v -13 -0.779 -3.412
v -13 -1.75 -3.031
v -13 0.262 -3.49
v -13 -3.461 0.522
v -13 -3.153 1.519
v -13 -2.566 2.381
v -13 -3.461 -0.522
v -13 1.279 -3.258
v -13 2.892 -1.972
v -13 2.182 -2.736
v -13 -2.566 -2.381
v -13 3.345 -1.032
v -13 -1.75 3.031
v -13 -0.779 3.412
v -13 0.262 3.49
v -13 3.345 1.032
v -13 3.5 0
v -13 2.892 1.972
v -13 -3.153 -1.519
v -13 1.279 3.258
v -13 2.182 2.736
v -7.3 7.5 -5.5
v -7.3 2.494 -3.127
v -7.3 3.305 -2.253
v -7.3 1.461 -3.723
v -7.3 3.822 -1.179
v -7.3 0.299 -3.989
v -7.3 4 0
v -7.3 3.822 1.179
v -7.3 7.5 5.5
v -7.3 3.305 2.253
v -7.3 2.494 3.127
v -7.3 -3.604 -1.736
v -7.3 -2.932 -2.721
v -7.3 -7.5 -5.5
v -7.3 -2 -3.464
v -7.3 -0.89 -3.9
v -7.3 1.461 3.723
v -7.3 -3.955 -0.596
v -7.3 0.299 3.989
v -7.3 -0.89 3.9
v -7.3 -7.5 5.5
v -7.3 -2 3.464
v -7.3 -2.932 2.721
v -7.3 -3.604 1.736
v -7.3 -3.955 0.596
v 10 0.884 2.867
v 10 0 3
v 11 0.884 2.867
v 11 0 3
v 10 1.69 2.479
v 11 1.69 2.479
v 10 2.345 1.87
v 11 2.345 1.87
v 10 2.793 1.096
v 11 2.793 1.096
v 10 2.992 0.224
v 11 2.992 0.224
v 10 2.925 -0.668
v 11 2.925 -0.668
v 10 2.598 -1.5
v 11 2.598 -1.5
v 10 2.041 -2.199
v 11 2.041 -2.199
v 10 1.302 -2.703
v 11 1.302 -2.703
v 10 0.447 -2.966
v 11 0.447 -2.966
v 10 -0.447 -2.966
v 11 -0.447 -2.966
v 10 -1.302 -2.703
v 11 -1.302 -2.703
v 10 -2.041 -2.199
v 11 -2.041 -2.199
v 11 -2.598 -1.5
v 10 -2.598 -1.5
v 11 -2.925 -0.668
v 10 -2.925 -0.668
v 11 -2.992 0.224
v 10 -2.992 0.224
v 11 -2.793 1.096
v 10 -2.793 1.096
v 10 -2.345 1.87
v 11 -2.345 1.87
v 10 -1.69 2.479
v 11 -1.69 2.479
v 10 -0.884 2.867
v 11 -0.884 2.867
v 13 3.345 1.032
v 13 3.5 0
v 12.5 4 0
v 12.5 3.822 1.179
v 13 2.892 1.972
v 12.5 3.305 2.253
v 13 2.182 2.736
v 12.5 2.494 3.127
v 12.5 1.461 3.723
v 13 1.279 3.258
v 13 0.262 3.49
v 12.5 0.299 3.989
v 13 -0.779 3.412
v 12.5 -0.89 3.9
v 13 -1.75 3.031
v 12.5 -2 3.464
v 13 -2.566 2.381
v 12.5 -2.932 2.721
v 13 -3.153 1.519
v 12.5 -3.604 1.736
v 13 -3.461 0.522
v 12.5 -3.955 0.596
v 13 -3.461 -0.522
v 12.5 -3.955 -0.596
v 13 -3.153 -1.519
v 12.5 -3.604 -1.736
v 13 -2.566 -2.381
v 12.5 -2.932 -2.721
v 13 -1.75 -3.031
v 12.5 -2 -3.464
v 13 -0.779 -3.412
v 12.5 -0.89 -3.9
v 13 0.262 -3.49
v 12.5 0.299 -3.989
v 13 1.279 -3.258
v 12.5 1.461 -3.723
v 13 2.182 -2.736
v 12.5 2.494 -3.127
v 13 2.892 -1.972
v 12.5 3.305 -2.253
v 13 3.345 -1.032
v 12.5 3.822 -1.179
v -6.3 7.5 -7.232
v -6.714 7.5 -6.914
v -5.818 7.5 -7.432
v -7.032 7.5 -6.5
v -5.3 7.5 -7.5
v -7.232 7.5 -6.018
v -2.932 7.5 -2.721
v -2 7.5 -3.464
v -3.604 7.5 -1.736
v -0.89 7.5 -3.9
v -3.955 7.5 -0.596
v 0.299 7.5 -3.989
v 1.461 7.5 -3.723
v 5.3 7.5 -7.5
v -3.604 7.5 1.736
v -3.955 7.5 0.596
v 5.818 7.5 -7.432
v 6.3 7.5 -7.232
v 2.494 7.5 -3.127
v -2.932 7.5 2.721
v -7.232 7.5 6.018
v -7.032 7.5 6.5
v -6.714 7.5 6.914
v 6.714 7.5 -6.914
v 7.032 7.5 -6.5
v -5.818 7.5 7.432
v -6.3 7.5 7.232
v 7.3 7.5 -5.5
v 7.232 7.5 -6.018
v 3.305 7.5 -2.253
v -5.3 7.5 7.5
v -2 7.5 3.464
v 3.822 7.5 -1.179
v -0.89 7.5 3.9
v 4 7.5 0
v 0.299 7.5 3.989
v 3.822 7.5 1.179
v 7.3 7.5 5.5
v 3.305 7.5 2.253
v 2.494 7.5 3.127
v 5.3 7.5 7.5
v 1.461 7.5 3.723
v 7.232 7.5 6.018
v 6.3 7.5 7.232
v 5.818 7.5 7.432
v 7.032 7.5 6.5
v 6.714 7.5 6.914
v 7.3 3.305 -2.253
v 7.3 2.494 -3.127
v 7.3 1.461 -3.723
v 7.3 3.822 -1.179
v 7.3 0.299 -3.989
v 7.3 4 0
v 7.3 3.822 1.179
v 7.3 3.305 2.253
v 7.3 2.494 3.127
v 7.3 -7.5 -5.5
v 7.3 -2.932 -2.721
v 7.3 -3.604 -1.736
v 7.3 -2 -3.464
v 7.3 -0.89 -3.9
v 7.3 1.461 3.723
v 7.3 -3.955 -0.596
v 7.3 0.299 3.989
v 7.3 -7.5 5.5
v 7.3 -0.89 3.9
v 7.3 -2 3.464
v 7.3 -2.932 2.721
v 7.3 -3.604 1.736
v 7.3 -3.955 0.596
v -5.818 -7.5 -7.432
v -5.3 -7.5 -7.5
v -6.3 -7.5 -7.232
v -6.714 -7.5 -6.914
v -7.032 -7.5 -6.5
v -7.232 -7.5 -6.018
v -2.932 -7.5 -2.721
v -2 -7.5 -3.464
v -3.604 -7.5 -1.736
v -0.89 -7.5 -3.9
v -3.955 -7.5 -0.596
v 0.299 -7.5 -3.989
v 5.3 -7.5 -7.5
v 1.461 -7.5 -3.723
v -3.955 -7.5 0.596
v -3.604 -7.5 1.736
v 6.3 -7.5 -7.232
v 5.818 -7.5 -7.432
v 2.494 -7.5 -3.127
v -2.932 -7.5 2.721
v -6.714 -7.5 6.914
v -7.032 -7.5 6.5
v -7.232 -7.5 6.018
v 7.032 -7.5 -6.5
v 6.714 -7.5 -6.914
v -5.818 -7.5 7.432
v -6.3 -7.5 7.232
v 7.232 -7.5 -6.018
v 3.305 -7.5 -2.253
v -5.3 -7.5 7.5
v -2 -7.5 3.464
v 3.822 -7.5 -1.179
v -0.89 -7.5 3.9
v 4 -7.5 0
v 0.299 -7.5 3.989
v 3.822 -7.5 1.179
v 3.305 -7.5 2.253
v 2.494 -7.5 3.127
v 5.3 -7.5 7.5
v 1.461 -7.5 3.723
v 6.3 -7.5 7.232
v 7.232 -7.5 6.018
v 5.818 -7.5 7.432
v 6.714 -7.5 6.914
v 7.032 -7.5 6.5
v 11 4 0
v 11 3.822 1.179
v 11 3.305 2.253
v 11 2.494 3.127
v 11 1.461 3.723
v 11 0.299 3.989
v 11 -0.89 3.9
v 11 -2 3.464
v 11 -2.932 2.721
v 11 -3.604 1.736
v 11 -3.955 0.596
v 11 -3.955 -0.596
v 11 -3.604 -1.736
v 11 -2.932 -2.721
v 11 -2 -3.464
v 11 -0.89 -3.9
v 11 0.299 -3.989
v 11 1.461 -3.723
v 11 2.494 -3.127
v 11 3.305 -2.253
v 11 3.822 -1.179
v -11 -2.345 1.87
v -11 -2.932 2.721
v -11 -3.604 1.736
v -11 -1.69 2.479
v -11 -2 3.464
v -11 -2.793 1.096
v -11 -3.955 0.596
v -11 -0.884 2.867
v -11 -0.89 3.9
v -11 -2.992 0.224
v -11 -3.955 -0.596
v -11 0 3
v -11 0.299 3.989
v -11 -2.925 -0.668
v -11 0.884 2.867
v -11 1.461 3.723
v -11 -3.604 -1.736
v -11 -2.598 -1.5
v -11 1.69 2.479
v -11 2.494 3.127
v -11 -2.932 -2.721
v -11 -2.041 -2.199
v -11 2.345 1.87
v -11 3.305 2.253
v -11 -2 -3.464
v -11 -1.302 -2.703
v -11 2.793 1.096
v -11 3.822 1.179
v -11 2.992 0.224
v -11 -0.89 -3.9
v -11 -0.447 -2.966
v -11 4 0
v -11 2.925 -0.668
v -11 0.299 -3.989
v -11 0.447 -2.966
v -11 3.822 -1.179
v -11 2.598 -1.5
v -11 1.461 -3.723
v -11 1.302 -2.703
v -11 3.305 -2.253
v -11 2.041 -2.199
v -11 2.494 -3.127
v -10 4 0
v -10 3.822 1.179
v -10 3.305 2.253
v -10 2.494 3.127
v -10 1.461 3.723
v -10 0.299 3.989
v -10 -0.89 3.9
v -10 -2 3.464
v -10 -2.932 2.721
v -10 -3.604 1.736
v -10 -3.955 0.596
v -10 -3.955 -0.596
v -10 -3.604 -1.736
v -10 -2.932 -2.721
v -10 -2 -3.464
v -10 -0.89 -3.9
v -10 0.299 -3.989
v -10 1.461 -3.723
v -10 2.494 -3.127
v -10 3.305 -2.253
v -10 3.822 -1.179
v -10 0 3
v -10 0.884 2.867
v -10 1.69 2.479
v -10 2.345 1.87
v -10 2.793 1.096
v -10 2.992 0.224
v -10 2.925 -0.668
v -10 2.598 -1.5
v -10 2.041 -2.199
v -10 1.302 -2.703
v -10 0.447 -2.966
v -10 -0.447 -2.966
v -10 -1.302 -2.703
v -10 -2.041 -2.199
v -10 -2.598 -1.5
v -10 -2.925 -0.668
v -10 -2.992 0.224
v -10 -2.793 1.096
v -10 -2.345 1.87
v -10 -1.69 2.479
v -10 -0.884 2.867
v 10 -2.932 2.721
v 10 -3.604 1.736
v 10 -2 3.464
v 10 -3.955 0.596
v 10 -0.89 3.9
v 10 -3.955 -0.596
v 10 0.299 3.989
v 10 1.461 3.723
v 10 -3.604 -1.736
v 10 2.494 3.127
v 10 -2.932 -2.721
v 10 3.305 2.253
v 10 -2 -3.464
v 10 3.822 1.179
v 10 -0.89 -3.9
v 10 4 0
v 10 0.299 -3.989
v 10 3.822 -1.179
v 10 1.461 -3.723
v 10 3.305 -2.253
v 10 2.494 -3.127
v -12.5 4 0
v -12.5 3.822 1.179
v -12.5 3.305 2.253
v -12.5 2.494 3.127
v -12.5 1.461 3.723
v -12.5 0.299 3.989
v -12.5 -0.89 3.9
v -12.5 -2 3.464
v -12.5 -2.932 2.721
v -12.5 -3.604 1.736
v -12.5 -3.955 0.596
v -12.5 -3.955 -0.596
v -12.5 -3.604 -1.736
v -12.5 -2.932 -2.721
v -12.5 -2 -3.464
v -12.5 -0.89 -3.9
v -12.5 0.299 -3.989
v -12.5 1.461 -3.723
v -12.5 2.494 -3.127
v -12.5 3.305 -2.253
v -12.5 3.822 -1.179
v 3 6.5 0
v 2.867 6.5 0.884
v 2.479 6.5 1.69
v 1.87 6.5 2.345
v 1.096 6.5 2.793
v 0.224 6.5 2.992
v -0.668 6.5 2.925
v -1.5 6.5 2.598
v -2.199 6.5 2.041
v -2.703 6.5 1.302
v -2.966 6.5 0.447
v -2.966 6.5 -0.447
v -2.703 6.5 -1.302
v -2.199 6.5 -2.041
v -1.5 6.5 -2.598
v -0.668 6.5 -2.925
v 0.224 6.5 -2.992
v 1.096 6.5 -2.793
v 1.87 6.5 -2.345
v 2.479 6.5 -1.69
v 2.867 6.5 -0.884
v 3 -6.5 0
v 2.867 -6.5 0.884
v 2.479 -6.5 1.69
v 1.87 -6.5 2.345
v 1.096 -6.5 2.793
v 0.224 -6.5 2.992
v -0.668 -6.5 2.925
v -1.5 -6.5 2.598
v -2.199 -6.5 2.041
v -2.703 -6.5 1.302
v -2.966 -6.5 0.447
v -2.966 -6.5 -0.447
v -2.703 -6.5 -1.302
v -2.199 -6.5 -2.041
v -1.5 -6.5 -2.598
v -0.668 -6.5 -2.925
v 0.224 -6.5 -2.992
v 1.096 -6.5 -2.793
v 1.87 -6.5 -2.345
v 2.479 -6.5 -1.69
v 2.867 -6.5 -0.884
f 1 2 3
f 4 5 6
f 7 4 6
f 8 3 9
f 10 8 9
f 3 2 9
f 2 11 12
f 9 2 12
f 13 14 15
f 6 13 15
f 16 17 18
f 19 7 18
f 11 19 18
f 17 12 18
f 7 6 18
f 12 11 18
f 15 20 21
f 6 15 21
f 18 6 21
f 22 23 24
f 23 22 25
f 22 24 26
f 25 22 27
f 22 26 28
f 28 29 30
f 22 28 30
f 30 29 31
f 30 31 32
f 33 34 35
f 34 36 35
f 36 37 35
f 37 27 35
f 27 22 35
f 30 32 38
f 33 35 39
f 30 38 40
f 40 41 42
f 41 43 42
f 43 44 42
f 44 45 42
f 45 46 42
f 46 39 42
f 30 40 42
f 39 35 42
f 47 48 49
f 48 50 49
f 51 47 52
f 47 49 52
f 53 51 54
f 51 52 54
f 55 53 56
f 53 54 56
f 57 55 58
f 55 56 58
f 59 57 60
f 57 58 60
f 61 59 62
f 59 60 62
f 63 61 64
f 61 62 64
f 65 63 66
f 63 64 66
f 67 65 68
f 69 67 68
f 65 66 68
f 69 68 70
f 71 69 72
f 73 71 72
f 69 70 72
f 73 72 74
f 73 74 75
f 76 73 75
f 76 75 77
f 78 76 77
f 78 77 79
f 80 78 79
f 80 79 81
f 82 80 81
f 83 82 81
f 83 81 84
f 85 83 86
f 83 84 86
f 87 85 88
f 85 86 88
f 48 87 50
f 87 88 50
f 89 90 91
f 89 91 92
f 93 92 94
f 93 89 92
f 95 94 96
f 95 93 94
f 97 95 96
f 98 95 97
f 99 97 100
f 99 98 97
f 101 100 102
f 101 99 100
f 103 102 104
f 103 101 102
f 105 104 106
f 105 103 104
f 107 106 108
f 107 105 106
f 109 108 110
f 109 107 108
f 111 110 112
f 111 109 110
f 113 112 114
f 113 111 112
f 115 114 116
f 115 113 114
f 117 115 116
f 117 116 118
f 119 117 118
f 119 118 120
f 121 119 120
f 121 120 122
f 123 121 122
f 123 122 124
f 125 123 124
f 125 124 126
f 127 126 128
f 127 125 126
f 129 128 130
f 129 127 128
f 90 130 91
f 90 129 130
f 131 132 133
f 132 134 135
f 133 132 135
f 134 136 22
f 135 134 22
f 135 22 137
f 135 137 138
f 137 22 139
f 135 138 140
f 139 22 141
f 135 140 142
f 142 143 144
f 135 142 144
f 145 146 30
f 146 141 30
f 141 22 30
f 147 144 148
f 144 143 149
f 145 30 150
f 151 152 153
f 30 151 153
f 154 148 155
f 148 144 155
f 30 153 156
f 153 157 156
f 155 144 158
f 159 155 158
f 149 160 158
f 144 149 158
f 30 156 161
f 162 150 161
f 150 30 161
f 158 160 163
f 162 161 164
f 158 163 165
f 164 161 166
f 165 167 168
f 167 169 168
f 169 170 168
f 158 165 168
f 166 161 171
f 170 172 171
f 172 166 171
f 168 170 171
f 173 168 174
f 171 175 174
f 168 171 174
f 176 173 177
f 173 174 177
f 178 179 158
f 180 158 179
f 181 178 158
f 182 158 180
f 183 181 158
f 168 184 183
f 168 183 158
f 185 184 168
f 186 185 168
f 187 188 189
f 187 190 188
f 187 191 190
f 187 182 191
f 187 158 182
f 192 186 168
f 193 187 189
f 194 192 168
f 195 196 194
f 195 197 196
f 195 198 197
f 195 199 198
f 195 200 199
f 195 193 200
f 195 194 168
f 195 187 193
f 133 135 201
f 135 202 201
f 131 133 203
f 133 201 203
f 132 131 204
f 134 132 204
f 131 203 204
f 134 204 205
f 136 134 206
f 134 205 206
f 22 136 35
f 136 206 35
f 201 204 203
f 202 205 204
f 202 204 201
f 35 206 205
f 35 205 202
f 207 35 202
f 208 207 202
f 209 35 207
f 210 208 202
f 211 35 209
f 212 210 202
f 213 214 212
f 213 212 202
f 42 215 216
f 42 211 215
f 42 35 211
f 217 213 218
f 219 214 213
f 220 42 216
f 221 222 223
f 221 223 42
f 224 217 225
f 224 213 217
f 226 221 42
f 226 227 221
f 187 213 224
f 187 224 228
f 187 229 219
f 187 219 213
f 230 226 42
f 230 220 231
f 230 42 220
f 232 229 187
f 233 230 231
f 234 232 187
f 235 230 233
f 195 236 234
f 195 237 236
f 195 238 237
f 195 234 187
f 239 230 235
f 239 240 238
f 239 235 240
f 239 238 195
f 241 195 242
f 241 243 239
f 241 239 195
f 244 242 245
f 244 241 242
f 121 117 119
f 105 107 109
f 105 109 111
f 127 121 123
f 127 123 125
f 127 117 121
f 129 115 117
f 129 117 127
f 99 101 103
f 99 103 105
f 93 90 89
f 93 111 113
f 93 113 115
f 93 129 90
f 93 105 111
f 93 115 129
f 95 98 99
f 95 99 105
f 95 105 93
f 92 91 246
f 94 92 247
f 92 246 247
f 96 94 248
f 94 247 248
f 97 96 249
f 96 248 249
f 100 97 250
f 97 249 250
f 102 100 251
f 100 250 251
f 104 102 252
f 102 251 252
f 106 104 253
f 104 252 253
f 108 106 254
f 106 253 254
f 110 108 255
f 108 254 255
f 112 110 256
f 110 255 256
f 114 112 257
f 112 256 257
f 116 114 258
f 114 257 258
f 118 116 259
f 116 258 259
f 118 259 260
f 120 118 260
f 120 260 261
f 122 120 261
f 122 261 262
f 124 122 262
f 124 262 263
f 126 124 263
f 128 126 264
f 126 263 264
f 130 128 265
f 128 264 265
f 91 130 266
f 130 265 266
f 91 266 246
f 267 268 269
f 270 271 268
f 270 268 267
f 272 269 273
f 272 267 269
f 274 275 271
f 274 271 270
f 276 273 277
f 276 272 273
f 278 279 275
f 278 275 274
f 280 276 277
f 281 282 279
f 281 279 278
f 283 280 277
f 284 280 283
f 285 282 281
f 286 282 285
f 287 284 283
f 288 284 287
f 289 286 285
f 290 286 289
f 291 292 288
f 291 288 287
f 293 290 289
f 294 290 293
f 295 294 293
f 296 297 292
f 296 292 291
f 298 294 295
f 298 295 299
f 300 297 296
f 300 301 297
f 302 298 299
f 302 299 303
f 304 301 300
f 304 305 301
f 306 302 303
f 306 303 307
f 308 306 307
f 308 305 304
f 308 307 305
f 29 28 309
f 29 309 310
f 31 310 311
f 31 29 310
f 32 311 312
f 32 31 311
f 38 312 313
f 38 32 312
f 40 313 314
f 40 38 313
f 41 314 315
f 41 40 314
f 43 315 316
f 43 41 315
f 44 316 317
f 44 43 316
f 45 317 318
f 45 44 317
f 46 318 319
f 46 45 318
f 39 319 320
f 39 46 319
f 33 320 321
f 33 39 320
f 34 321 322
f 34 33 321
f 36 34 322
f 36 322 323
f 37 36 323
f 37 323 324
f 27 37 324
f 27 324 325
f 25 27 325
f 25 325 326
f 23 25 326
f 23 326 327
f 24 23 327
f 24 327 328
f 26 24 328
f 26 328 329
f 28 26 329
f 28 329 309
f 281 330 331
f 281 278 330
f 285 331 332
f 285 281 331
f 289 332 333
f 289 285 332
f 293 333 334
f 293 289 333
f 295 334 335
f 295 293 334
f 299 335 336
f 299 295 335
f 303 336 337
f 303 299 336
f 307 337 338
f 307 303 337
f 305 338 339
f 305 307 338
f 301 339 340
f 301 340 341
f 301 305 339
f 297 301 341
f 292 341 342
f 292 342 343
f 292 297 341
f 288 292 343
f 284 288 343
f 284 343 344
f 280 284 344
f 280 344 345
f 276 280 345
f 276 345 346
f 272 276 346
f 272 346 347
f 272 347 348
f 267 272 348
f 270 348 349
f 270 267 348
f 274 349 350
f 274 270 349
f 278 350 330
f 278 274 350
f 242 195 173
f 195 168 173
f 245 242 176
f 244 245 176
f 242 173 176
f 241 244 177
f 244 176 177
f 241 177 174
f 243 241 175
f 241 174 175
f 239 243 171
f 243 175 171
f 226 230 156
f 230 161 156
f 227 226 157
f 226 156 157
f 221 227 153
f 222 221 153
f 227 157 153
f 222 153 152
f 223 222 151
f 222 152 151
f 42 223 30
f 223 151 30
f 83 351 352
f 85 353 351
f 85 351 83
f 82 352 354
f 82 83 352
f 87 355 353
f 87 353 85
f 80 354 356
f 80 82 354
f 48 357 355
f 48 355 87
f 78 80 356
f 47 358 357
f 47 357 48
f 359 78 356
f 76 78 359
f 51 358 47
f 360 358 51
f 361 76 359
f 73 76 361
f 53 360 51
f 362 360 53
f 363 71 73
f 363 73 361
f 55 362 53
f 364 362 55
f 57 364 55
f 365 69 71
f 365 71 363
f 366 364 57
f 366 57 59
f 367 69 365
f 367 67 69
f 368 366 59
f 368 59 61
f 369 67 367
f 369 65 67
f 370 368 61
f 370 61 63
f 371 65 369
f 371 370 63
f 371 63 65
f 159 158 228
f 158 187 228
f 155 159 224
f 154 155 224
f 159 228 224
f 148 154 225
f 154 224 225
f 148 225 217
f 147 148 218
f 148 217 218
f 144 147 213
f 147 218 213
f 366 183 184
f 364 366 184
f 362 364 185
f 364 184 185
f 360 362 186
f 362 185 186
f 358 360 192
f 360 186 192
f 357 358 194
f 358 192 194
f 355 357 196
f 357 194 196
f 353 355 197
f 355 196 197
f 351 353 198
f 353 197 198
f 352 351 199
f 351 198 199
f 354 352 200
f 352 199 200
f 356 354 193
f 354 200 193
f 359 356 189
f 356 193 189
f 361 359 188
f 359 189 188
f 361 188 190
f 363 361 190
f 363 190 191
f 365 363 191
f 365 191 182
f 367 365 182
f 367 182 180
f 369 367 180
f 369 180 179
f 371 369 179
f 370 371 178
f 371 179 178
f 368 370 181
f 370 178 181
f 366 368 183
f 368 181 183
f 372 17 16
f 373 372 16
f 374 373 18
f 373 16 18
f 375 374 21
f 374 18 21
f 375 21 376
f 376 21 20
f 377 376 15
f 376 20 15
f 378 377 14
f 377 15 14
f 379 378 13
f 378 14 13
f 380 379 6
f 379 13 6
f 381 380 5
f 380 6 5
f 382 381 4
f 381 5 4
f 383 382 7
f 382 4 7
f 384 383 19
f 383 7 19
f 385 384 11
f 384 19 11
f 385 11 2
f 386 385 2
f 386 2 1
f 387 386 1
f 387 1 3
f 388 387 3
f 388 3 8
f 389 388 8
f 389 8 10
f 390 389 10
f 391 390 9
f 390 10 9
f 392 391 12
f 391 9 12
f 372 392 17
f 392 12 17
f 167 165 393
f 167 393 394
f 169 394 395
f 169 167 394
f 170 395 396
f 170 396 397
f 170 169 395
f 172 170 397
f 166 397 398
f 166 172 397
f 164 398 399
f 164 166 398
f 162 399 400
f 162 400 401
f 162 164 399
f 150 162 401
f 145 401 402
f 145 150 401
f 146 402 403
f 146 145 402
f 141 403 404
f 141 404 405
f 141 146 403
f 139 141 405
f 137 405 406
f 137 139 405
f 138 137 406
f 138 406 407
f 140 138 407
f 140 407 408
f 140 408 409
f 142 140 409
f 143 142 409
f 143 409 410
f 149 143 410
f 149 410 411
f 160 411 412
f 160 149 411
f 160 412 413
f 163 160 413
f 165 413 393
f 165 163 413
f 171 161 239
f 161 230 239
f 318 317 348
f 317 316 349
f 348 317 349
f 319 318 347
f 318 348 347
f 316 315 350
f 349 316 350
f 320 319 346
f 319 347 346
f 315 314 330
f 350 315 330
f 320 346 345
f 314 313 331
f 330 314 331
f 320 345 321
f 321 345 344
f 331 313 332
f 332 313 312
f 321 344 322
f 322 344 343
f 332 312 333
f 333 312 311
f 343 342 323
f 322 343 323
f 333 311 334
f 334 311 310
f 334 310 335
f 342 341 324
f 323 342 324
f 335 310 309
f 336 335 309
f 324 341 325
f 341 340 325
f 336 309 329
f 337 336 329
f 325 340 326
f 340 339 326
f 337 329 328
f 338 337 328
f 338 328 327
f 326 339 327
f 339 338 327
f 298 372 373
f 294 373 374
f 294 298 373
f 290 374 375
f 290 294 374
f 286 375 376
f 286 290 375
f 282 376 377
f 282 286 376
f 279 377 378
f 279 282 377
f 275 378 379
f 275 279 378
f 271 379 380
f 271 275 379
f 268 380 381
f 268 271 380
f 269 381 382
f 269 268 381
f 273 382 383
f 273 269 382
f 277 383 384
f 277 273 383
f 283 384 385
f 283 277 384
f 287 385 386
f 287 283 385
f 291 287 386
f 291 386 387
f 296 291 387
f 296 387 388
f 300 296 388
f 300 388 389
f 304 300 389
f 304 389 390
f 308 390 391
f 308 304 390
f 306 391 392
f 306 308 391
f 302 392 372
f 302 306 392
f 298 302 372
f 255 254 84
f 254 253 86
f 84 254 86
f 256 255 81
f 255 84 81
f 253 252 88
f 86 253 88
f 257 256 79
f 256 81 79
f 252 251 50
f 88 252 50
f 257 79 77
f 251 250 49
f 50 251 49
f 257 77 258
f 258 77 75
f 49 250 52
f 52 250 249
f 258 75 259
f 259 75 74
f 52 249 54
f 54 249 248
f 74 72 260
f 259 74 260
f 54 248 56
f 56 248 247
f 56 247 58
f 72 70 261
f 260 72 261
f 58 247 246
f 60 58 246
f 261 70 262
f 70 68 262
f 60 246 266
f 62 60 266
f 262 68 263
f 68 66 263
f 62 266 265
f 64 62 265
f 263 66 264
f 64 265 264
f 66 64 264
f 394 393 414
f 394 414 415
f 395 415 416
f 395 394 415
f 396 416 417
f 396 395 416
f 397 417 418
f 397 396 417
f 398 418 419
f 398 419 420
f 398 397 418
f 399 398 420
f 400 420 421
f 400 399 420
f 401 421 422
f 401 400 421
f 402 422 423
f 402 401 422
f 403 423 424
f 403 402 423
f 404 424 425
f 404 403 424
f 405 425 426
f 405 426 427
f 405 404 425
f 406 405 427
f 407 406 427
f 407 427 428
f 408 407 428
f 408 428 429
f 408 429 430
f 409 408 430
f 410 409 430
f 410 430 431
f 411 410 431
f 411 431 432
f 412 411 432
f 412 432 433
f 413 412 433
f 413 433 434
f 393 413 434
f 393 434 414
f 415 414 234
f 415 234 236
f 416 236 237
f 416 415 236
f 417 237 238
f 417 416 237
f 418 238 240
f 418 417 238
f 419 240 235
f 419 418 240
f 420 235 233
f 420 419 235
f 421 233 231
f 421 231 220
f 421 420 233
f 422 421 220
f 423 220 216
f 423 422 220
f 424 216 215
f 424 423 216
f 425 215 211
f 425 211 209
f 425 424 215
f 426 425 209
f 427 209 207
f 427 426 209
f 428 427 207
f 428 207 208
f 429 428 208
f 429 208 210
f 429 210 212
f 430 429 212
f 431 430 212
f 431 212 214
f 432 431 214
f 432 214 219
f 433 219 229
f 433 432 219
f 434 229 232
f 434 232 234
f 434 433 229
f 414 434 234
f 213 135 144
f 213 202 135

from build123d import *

# Parameters (mm, degrees)
F0_W     = 14.6
F0_H     = 15
F0_R     = 3
F1_DEPTH = 7.5
F2_SIZE  = 1
F3_R     = 4
F4_DEPTH = 5.7
F5_W     = 1
F5_H     = 1
F7_SIZE  = 0.5
F8_R     = 2


# Not quite as in the source:
# - a pattern or mirror of a feature is missing from the dataset's text; its kind, count and spacing are read off the source's solid


with BuildPart() as f1:
    # F0 (on Front) → F1 (new body, symmetric)
    with BuildSketch(Plane.XZ):
        Rectangle(F0_W, F0_H)
        Circle(F0_R, mode=Mode.SUBTRACT)
    extrude(amount=F1_DEPTH, both=True)

    # F2
    f2_edges = [f1.edges().sort_by_distance(p)[0] for p in [
        (-3, -7.5, 0),
        (-3, 7.5, 0),
    ]]
    chamfer(f2_edges, length=F2_SIZE)

    # F3 (on face) → F4 (join)
    with BuildSketch(Plane.YZ.offset(7.3)):
        Circle(F3_R)
    f4 = extrude(amount=F4_DEPTH)

    # F4_copies: F4 across plane
    add(f4.mirror(Plane(origin=(0, 0, 0), x_dir=(0, 0, -1), z_dir=(-1, 0, 0))))

    # F5 (on Front) → F6 (revolve, cut)
    with BuildSketch(Plane.XZ):
        with Locations((10.5, 3.5)):
            Rectangle(F5_W, F5_H)
    f6 = revolve(axis=Axis((10.5, 0, 0), (-1, 0, 0)), mode=Mode.SUBTRACT)

    # F6_copies: F6 across plane
    add(f6.mirror(Plane(origin=(0, 0, 0), x_dir=(0, 0, -1), z_dir=(-1, 0, 0))), mode=Mode.SUBTRACT)

    # F7
    f7_edges = [f1.edges().sort_by_distance(p)[0] for p in [
        (13, -4, 0),
        (-13, -4, 0),
    ]]
    chamfer(f7_edges, length=F7_SIZE)

    # F8
    f8_edges = [f1.edges().sort_by_distance(p)[0] for p in [
        (-7.3, 0, 7.5),
        (7.3, 0, 7.5),
        (-7.3, 0, -7.5),
        (7.3, 0, -7.5),
    ]]
    fillet(f8_edges, radius=F8_R)


solid = f1.part
